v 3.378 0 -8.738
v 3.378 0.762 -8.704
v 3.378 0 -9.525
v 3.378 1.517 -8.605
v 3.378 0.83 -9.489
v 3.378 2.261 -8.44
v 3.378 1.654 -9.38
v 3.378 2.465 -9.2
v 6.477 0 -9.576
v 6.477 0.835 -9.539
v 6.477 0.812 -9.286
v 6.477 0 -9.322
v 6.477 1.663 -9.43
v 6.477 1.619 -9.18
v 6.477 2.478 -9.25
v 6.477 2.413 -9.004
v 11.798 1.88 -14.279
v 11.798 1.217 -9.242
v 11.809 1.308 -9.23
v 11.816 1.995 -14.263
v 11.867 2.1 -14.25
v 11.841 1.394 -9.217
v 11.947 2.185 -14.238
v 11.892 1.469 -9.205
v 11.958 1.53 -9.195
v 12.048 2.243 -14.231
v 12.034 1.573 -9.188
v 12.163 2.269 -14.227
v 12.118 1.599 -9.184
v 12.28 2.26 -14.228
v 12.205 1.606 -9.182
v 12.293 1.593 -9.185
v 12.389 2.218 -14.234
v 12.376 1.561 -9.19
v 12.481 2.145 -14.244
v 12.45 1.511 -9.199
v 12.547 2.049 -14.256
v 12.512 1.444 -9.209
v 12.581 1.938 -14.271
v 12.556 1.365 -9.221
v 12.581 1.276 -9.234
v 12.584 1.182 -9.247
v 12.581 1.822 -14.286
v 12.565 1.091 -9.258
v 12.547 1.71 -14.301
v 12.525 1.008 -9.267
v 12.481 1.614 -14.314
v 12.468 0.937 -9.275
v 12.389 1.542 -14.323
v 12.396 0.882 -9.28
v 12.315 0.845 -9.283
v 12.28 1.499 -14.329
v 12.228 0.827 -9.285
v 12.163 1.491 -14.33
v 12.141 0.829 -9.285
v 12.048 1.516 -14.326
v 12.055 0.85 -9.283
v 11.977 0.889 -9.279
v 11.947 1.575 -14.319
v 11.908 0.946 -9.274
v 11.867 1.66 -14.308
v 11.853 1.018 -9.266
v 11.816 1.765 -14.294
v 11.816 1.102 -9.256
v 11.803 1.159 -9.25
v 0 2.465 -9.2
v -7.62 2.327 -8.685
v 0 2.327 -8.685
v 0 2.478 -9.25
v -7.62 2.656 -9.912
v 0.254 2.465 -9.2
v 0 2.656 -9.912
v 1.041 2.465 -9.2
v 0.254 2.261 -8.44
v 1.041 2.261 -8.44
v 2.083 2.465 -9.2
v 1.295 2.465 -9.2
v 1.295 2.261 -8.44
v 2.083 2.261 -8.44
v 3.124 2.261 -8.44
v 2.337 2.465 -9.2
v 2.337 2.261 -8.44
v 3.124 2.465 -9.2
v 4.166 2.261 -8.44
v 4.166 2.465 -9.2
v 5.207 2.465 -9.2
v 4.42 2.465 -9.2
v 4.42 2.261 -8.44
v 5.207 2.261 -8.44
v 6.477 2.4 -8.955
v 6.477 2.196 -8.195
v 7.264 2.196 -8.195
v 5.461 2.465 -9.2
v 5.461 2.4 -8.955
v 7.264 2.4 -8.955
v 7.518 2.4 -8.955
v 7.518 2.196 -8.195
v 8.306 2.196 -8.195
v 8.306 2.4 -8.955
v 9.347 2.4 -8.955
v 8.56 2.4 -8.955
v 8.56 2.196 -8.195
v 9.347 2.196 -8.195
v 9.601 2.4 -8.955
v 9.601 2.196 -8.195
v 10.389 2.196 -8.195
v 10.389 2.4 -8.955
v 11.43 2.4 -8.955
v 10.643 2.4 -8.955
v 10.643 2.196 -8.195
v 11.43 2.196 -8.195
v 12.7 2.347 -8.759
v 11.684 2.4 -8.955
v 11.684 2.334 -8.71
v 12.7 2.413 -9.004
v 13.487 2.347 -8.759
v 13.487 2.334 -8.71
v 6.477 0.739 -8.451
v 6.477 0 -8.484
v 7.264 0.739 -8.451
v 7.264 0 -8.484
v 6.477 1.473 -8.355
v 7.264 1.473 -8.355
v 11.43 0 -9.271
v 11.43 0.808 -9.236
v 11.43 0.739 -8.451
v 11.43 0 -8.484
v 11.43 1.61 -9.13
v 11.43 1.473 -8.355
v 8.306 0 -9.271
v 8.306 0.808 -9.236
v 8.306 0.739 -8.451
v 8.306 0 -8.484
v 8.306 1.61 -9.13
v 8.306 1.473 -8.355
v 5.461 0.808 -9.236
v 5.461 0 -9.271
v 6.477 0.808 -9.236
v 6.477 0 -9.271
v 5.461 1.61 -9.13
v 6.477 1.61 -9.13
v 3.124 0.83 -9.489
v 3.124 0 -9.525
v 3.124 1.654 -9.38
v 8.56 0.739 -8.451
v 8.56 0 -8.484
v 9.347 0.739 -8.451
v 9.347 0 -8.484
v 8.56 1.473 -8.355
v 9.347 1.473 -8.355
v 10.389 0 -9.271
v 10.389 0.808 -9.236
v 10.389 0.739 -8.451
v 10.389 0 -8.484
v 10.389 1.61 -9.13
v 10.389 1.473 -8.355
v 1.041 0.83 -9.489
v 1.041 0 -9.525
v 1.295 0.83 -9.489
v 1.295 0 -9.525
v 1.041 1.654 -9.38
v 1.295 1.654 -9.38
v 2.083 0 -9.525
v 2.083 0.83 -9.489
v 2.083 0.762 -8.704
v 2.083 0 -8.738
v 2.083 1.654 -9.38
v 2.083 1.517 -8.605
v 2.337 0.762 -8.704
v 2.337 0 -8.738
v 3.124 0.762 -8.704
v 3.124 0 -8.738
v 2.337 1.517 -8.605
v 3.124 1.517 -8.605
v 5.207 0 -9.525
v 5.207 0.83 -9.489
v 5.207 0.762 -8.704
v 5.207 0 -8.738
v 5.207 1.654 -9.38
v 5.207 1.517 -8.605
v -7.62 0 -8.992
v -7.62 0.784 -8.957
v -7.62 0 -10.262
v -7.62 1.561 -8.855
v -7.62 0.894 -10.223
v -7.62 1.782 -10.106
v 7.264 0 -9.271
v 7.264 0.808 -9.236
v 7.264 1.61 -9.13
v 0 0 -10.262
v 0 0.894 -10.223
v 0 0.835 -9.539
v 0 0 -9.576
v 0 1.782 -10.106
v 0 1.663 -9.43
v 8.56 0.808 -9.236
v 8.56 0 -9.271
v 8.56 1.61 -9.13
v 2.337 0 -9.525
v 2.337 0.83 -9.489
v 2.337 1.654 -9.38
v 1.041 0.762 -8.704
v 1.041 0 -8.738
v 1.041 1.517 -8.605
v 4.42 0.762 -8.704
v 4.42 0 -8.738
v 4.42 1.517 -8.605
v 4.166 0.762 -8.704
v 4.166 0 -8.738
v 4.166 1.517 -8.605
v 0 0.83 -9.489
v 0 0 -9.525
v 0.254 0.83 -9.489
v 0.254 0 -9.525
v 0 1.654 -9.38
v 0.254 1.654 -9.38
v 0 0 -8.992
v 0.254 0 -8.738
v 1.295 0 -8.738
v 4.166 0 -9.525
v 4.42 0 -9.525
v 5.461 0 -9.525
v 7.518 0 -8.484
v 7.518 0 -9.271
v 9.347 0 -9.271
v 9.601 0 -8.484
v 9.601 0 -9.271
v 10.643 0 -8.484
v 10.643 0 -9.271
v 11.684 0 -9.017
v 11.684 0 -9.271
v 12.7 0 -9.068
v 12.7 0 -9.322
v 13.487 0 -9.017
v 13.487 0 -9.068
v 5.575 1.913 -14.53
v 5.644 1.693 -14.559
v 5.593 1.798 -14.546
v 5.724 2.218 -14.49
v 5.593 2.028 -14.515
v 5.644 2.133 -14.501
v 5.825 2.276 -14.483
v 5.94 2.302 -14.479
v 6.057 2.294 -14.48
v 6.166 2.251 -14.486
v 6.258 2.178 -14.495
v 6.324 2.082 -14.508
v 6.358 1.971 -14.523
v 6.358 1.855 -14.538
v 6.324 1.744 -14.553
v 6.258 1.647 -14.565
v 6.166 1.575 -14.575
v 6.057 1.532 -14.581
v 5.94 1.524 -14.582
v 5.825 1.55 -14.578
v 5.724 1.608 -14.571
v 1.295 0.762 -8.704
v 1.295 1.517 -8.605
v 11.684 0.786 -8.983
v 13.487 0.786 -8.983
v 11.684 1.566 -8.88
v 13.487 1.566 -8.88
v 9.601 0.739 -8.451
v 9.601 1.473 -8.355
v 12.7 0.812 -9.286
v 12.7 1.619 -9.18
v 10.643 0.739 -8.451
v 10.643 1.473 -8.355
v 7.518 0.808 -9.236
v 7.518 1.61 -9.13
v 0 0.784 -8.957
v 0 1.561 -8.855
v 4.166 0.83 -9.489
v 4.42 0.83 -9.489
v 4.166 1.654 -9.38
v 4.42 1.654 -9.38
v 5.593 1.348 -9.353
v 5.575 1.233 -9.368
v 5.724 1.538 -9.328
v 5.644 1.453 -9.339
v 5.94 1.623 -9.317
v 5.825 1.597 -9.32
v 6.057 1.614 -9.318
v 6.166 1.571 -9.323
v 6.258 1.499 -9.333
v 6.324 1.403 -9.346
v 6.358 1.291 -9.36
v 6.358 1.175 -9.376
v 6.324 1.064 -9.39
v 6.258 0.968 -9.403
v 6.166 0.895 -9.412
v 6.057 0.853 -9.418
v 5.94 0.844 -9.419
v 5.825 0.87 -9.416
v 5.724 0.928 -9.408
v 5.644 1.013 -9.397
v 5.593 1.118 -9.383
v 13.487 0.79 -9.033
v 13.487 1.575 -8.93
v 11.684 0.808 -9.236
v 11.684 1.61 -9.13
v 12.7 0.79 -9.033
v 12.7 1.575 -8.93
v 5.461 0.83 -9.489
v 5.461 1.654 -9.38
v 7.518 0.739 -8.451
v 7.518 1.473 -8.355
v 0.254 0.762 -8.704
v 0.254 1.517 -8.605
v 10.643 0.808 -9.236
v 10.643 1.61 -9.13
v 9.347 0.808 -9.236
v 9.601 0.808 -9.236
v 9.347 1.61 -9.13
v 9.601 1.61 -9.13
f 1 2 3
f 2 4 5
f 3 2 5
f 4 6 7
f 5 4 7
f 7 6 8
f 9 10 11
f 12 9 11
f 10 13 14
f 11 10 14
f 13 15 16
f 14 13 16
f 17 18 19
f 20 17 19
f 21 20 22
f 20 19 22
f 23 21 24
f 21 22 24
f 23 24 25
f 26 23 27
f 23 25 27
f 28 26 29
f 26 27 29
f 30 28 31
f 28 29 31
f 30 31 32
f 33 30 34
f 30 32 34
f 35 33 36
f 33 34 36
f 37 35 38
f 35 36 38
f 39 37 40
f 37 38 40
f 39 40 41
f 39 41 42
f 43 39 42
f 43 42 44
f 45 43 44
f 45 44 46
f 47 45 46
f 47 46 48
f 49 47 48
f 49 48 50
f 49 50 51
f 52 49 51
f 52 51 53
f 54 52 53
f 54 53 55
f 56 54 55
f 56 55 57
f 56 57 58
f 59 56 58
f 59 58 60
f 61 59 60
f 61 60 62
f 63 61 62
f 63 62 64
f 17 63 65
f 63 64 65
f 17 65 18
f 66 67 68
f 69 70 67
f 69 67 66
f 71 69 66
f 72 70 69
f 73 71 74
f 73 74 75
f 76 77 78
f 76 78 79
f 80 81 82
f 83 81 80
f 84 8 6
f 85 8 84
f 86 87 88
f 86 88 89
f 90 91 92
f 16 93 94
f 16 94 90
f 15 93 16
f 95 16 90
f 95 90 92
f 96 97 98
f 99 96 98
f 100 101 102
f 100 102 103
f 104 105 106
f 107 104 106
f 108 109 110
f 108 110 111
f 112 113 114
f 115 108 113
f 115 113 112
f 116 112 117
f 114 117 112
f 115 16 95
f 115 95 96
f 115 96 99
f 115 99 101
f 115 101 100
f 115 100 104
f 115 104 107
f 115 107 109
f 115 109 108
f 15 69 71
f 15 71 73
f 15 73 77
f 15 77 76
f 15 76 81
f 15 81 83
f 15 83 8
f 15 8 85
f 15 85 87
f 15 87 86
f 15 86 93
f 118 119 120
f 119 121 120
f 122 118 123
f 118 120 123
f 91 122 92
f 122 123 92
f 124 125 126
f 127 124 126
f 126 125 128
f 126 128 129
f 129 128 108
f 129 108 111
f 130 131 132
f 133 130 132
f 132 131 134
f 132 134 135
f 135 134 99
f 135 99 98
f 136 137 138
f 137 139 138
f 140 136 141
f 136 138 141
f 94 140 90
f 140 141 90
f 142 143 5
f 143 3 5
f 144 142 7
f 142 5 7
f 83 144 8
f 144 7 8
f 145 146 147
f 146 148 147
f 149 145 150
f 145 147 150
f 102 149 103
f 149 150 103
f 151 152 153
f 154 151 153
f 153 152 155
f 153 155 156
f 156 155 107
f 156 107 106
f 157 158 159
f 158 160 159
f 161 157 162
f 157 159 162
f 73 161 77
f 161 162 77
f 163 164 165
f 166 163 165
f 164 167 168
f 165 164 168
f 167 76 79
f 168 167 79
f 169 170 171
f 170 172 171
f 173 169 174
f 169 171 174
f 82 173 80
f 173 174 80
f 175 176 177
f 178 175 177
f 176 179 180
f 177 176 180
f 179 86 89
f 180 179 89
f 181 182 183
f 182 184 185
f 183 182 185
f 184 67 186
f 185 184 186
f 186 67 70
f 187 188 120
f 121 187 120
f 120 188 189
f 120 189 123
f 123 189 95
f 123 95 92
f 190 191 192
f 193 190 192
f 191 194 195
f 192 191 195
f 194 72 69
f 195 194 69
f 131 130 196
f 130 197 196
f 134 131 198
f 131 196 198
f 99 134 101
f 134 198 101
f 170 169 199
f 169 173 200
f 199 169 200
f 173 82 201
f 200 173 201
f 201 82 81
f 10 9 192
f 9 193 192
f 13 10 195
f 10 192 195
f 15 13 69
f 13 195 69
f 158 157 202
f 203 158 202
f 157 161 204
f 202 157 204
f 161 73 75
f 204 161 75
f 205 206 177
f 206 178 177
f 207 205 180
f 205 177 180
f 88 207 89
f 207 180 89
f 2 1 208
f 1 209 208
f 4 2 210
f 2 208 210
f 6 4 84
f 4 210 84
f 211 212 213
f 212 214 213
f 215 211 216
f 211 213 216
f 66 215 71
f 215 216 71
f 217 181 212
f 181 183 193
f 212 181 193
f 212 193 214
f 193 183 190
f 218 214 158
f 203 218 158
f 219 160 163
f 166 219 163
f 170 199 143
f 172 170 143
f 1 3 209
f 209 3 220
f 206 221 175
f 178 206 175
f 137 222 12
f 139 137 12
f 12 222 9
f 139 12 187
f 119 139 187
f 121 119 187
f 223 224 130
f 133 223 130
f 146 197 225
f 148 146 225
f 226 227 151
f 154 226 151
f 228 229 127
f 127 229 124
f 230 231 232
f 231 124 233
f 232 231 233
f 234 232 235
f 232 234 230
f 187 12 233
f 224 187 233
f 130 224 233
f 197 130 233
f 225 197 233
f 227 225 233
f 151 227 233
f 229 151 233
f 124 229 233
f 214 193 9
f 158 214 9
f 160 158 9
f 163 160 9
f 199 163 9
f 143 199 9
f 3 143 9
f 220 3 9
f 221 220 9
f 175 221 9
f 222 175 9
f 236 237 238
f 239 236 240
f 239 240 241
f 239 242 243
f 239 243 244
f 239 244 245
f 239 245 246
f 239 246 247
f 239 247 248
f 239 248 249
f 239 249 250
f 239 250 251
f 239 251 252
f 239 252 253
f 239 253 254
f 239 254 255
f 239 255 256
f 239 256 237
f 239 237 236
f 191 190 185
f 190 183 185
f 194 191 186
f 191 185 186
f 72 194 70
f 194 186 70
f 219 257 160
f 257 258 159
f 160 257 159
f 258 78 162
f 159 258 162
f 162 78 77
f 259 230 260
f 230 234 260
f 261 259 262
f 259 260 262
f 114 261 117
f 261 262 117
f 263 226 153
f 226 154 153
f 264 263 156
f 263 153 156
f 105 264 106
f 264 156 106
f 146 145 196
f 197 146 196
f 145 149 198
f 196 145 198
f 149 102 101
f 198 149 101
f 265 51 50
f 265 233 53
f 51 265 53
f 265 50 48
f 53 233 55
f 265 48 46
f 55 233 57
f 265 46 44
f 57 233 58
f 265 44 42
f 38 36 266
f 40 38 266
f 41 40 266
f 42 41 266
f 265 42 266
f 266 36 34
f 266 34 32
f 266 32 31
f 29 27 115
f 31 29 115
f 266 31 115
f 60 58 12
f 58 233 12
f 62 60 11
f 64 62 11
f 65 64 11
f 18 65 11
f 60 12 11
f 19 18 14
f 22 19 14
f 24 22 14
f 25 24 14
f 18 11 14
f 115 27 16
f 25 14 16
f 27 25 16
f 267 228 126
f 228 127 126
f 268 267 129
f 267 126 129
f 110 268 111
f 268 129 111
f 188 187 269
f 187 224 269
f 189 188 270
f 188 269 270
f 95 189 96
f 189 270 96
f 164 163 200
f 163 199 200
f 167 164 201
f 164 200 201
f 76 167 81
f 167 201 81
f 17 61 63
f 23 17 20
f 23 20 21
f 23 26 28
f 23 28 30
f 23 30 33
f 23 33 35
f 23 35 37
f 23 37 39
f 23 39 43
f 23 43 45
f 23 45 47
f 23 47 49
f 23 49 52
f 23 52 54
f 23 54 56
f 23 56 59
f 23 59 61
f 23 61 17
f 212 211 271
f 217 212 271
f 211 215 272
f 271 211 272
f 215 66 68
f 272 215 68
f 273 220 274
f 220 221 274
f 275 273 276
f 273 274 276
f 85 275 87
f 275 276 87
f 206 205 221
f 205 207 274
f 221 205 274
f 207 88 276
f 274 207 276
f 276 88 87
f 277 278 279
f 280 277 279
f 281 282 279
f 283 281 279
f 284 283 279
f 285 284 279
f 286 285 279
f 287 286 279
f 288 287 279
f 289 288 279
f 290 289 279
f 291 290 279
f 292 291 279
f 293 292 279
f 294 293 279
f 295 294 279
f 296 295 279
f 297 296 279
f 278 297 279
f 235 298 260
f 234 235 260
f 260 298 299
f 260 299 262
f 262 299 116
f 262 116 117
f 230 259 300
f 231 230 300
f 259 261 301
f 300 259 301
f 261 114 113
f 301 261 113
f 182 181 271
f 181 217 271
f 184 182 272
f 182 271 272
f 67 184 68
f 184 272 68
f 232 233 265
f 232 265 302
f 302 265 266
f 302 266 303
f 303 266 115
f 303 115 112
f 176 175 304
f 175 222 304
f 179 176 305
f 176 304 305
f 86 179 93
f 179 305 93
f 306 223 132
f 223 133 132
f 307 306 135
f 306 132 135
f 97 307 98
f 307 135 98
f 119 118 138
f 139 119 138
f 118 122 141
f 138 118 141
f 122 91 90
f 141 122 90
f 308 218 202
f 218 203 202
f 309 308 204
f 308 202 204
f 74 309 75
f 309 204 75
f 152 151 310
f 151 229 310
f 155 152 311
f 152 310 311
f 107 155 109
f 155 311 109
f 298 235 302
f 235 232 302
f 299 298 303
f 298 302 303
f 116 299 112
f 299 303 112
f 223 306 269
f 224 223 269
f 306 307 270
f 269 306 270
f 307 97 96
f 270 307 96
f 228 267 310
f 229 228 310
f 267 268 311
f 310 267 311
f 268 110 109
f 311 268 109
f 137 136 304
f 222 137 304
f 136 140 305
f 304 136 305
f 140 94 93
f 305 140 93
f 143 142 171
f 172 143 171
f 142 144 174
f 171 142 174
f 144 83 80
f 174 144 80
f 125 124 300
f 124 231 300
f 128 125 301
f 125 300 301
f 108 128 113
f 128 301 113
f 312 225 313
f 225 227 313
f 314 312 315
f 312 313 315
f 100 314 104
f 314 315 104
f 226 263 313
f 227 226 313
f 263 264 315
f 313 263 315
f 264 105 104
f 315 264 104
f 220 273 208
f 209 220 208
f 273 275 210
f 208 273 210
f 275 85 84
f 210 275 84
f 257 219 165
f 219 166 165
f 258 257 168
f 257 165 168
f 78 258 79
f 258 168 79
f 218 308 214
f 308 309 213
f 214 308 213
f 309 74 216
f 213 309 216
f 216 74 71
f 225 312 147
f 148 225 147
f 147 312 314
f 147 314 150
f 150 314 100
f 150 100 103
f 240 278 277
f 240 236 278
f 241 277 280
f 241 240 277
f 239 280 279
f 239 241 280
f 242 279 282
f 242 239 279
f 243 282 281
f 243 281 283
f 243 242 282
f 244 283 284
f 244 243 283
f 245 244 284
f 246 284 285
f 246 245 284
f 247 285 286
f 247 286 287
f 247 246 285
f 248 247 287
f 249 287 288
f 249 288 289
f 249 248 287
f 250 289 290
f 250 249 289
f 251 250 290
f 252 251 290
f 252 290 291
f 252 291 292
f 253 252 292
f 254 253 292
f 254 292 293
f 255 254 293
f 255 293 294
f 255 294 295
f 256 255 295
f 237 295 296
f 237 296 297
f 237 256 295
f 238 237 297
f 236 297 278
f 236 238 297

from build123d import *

# Parameters (mm, degrees)
REVOLVE1_ANGLE           = 15
SKETCH2_R                = 0.3937
BOSS_EXTRUDE2_DEPTH      = 5.08
BOSS_EXTRUDE2_DEPTH_BACK = 0.127
BOSS_EXTRUDE3_START      = -0.008318
SKETCH3_R                = 0.3937
BOSS_EXTRUDE3_DEPTH      = 5.088318


with BuildPart() as part:
    # Sketch1 → Revolve1 (revolve)
    with BuildSketch(Plane(origin=(0, 0, 0), x_dir=(1, 0, 0), z_dir=(0, 1, 0))):
        Polygon((0.254, 9.525), (0.254, 8.7376), (1.0414, 8.7376), (1.0414, 9.525), (1.2954, 9.525), (1.2954, 8.7376), (2.0828, 8.7376), (2.0828, 9.525), (2.3368, 9.525), (2.3368, 8.7376), (3.1242, 8.7376), (3.1242, 9.525), (3.3782, 9.525), (3.3782, 8.7376), (4.1656, 8.7376), (4.1656, 9.525), (4.4196, 9.525), (4.4196, 8.7376), (5.207, 8.7376), (5.207, 9.525), (5.461, 9.525), (5.461, 9.271), (6.477, 9.271), (6.477, 8.4836), (7.2644, 8.4836), (7.2644, 9.271), (7.5184, 9.271), (7.5184, 8.4836), (8.3058, 8.4836), (8.3058, 9.271), (8.5598, 9.271), (8.5598, 8.4836), (9.3472, 8.4836), (9.3472, 9.271), (9.6012, 9.271), (9.6012, 8.4836), (10.3886, 8.4836), (10.3886, 9.271), (10.6426, 9.271), (10.6426, 8.4836), (11.43, 8.4836), (11.43, 9.271), (11.684, 9.271), (11.684, 9.017), (12.7, 9.017), (13.4874, 9.017), (13.4874, 9.0678), (12.7, 9.0678), (12.7, 9.3218), (6.477, 9.3218), (6.477, 9.5758), (0, 9.5758), (0, 10.2616), (-7.62, 10.2616), (-7.62, 8.9916), (0, 8.9916), (0, 9.525), align=None)
    revolve(axis=Axis((0, 0, 0), (1, 0, 0)), revolution_arc=REVOLVE1_ANGLE)

    # Sketch3 → Boss-Extrude3 (add)
    with BuildSketch(Plane(origin=(0, 1.216739059, -9.242050709), x_dir=(-1, 0, 0), z_dir=(0, 0.130526192, -0.991444861)).offset(BOSS_EXTRUDE3_START)):
        with Locations((-12.192, 0)):
            Circle(SKETCH3_R)
    extrude(amount=BOSS_EXTRUDE3_DEPTH)


with BuildPart() as body_2:
    # Sketch2 → Boss-Extrude2 (new body, two sides)
    with BuildSketch(Plane(origin=(0, 1.249892711, -9.493877704), x_dir=(-1, 0, 0), z_dir=(0, 0.130526192, -0.991444861))) as boss_extrude2_sk:
        with Locations((-5.969, 0)):
            Circle(SKETCH2_R)
    extrude(amount=BOSS_EXTRUDE2_DEPTH)
    extrude(boss_extrude2_sk.sketch, amount=-BOSS_EXTRUDE2_DEPTH_BACK)


solid = Compound([part.part, body_2.part])
